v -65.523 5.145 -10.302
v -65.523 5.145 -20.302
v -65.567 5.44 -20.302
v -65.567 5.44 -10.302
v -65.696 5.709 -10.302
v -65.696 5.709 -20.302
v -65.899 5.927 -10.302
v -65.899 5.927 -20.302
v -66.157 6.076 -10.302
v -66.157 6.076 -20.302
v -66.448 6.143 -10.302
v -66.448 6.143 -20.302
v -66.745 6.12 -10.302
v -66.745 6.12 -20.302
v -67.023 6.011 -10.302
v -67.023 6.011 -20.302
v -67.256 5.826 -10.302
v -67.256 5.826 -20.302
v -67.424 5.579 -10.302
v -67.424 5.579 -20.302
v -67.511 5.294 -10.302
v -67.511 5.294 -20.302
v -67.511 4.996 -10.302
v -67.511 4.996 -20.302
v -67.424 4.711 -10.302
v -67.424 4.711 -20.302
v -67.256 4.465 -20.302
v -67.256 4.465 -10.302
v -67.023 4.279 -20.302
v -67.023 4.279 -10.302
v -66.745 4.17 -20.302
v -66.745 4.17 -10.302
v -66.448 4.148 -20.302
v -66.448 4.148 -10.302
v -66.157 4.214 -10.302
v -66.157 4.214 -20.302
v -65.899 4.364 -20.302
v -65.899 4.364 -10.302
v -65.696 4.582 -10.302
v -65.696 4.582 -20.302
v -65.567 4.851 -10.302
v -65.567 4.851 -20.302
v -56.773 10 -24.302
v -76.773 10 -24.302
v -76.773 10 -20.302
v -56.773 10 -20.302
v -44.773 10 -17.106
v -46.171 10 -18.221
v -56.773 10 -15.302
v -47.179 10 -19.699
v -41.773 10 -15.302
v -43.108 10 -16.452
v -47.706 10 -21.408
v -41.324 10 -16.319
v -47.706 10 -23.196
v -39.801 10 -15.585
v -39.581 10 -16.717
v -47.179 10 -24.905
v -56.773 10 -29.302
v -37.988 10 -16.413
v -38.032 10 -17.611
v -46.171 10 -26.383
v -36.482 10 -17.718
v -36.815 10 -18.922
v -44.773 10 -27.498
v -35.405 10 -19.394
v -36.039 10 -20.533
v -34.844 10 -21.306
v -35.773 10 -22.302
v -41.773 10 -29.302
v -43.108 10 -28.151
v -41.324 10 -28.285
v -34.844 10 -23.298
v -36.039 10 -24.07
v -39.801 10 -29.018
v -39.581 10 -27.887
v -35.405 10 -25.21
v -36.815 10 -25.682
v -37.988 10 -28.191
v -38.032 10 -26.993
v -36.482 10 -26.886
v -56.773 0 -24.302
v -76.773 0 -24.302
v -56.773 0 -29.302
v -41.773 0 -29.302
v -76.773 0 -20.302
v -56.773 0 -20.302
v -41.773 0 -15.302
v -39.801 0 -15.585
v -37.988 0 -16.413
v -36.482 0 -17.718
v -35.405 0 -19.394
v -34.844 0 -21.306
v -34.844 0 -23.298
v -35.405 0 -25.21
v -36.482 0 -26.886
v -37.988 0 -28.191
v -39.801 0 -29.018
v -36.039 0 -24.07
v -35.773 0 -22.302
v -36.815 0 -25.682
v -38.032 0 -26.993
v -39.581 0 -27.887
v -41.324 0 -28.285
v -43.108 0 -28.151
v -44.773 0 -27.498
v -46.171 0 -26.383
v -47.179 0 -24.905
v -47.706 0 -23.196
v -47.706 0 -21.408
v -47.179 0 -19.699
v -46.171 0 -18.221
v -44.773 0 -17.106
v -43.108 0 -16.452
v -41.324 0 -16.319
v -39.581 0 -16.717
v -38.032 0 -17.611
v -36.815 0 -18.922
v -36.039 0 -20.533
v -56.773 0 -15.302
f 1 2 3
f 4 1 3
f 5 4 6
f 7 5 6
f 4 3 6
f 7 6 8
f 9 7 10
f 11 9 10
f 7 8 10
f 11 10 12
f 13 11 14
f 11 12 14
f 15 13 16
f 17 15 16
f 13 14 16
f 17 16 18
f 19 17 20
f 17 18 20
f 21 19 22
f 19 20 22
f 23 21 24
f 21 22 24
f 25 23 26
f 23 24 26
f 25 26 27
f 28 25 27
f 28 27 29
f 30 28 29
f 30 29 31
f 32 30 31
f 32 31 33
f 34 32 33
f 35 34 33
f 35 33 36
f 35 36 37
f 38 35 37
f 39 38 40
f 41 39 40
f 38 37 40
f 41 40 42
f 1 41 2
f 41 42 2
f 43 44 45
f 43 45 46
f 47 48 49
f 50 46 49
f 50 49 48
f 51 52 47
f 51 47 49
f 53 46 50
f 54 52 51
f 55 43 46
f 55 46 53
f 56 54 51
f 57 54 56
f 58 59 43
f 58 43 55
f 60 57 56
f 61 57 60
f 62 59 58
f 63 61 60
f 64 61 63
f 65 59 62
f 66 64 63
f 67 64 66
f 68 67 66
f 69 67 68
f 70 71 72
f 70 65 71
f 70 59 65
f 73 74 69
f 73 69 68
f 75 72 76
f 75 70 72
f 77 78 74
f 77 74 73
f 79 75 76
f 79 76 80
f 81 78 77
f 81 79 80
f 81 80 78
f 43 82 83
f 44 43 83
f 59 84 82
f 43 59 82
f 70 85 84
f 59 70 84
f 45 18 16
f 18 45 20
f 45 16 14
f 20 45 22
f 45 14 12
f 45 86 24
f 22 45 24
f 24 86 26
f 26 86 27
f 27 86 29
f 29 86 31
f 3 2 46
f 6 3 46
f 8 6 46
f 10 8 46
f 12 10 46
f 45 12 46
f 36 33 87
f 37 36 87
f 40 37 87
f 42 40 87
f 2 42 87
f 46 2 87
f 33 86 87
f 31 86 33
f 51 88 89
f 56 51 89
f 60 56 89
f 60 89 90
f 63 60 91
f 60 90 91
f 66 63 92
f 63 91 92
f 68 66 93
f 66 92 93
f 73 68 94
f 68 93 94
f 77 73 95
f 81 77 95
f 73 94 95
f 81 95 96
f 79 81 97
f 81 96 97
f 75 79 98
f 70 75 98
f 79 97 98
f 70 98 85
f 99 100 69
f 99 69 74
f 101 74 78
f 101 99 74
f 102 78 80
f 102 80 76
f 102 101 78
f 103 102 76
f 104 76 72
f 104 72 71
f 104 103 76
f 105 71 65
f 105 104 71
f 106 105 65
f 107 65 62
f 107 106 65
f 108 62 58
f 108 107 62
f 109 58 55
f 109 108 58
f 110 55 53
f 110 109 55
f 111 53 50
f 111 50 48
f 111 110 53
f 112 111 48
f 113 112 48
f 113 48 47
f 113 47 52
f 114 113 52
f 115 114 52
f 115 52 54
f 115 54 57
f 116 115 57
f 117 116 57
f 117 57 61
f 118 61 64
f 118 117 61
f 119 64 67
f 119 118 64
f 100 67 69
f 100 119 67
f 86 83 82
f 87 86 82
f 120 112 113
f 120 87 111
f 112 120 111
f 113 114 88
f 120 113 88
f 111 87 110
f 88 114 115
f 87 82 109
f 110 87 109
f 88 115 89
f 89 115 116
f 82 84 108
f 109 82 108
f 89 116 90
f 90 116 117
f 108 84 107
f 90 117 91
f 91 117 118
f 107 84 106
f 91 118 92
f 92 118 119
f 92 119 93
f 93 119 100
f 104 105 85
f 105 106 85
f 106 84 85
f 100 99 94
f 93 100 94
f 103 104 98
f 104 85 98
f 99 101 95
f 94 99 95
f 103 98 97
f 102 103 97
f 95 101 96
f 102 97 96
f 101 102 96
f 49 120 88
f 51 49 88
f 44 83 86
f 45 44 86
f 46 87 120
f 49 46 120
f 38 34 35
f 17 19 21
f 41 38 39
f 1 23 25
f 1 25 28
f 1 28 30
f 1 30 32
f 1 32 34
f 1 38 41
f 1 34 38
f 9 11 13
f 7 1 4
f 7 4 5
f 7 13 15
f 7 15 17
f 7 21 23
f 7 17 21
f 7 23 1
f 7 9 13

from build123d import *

# Parameters (mm, degrees)
CROQUIS2_R              = 6
SALIENTE_EXTRUIR3_DEPTH = 10
CROQUIS9_R              = 1
SALIENTE_EXTRUIR6_DEPTH = 10


with BuildPart() as part:
    # Croquis2 → Saliente-Extruir3 (new body)
    with BuildSketch(Plane(origin=(0, 0, 0), x_dir=(1, 0, 0), z_dir=(0, 1, 0))):
        with BuildLine():
            Line((-56.772722473, 15.301893186), (-41.772722473, 15.301893186))
            ThreePointArc((-41.772722473, 15.301893186), (-34.772722473, 22.301893186), (-41.772722473, 29.301893186))
            Line((-41.772722473, 29.301893186), (-56.772722473, 29.301893186))
            Line((-56.772722473, 29.301893186), (-56.772722473, 24.301893186))
            Line((-56.772722473, 24.301893186), (-76.772722473, 24.301893186))
            Line((-76.772722473, 24.301893186), (-76.772722473, 20.301893186))
            Line((-76.772722473, 20.301893186), (-56.772722473, 20.301893186))
            Line((-56.772722473, 20.301893186), (-56.772722473, 15.301893186))
        make_face()
        with Locations((-41.772722473, 22.301893186)):
            Circle(CROQUIS2_R, mode=Mode.SUBTRACT)
    extrude(amount=SALIENTE_EXTRUIR3_DEPTH)

    # Croquis9 → Saliente-Extruir6 (add)
    with BuildSketch(Plane.XY.offset(-20.301893186)):
        with Locations((-66.52258031, 5.145347446)):
            Circle(CROQUIS9_R)
    extrude(amount=SALIENTE_EXTRUIR6_DEPTH)


solid = part.part
